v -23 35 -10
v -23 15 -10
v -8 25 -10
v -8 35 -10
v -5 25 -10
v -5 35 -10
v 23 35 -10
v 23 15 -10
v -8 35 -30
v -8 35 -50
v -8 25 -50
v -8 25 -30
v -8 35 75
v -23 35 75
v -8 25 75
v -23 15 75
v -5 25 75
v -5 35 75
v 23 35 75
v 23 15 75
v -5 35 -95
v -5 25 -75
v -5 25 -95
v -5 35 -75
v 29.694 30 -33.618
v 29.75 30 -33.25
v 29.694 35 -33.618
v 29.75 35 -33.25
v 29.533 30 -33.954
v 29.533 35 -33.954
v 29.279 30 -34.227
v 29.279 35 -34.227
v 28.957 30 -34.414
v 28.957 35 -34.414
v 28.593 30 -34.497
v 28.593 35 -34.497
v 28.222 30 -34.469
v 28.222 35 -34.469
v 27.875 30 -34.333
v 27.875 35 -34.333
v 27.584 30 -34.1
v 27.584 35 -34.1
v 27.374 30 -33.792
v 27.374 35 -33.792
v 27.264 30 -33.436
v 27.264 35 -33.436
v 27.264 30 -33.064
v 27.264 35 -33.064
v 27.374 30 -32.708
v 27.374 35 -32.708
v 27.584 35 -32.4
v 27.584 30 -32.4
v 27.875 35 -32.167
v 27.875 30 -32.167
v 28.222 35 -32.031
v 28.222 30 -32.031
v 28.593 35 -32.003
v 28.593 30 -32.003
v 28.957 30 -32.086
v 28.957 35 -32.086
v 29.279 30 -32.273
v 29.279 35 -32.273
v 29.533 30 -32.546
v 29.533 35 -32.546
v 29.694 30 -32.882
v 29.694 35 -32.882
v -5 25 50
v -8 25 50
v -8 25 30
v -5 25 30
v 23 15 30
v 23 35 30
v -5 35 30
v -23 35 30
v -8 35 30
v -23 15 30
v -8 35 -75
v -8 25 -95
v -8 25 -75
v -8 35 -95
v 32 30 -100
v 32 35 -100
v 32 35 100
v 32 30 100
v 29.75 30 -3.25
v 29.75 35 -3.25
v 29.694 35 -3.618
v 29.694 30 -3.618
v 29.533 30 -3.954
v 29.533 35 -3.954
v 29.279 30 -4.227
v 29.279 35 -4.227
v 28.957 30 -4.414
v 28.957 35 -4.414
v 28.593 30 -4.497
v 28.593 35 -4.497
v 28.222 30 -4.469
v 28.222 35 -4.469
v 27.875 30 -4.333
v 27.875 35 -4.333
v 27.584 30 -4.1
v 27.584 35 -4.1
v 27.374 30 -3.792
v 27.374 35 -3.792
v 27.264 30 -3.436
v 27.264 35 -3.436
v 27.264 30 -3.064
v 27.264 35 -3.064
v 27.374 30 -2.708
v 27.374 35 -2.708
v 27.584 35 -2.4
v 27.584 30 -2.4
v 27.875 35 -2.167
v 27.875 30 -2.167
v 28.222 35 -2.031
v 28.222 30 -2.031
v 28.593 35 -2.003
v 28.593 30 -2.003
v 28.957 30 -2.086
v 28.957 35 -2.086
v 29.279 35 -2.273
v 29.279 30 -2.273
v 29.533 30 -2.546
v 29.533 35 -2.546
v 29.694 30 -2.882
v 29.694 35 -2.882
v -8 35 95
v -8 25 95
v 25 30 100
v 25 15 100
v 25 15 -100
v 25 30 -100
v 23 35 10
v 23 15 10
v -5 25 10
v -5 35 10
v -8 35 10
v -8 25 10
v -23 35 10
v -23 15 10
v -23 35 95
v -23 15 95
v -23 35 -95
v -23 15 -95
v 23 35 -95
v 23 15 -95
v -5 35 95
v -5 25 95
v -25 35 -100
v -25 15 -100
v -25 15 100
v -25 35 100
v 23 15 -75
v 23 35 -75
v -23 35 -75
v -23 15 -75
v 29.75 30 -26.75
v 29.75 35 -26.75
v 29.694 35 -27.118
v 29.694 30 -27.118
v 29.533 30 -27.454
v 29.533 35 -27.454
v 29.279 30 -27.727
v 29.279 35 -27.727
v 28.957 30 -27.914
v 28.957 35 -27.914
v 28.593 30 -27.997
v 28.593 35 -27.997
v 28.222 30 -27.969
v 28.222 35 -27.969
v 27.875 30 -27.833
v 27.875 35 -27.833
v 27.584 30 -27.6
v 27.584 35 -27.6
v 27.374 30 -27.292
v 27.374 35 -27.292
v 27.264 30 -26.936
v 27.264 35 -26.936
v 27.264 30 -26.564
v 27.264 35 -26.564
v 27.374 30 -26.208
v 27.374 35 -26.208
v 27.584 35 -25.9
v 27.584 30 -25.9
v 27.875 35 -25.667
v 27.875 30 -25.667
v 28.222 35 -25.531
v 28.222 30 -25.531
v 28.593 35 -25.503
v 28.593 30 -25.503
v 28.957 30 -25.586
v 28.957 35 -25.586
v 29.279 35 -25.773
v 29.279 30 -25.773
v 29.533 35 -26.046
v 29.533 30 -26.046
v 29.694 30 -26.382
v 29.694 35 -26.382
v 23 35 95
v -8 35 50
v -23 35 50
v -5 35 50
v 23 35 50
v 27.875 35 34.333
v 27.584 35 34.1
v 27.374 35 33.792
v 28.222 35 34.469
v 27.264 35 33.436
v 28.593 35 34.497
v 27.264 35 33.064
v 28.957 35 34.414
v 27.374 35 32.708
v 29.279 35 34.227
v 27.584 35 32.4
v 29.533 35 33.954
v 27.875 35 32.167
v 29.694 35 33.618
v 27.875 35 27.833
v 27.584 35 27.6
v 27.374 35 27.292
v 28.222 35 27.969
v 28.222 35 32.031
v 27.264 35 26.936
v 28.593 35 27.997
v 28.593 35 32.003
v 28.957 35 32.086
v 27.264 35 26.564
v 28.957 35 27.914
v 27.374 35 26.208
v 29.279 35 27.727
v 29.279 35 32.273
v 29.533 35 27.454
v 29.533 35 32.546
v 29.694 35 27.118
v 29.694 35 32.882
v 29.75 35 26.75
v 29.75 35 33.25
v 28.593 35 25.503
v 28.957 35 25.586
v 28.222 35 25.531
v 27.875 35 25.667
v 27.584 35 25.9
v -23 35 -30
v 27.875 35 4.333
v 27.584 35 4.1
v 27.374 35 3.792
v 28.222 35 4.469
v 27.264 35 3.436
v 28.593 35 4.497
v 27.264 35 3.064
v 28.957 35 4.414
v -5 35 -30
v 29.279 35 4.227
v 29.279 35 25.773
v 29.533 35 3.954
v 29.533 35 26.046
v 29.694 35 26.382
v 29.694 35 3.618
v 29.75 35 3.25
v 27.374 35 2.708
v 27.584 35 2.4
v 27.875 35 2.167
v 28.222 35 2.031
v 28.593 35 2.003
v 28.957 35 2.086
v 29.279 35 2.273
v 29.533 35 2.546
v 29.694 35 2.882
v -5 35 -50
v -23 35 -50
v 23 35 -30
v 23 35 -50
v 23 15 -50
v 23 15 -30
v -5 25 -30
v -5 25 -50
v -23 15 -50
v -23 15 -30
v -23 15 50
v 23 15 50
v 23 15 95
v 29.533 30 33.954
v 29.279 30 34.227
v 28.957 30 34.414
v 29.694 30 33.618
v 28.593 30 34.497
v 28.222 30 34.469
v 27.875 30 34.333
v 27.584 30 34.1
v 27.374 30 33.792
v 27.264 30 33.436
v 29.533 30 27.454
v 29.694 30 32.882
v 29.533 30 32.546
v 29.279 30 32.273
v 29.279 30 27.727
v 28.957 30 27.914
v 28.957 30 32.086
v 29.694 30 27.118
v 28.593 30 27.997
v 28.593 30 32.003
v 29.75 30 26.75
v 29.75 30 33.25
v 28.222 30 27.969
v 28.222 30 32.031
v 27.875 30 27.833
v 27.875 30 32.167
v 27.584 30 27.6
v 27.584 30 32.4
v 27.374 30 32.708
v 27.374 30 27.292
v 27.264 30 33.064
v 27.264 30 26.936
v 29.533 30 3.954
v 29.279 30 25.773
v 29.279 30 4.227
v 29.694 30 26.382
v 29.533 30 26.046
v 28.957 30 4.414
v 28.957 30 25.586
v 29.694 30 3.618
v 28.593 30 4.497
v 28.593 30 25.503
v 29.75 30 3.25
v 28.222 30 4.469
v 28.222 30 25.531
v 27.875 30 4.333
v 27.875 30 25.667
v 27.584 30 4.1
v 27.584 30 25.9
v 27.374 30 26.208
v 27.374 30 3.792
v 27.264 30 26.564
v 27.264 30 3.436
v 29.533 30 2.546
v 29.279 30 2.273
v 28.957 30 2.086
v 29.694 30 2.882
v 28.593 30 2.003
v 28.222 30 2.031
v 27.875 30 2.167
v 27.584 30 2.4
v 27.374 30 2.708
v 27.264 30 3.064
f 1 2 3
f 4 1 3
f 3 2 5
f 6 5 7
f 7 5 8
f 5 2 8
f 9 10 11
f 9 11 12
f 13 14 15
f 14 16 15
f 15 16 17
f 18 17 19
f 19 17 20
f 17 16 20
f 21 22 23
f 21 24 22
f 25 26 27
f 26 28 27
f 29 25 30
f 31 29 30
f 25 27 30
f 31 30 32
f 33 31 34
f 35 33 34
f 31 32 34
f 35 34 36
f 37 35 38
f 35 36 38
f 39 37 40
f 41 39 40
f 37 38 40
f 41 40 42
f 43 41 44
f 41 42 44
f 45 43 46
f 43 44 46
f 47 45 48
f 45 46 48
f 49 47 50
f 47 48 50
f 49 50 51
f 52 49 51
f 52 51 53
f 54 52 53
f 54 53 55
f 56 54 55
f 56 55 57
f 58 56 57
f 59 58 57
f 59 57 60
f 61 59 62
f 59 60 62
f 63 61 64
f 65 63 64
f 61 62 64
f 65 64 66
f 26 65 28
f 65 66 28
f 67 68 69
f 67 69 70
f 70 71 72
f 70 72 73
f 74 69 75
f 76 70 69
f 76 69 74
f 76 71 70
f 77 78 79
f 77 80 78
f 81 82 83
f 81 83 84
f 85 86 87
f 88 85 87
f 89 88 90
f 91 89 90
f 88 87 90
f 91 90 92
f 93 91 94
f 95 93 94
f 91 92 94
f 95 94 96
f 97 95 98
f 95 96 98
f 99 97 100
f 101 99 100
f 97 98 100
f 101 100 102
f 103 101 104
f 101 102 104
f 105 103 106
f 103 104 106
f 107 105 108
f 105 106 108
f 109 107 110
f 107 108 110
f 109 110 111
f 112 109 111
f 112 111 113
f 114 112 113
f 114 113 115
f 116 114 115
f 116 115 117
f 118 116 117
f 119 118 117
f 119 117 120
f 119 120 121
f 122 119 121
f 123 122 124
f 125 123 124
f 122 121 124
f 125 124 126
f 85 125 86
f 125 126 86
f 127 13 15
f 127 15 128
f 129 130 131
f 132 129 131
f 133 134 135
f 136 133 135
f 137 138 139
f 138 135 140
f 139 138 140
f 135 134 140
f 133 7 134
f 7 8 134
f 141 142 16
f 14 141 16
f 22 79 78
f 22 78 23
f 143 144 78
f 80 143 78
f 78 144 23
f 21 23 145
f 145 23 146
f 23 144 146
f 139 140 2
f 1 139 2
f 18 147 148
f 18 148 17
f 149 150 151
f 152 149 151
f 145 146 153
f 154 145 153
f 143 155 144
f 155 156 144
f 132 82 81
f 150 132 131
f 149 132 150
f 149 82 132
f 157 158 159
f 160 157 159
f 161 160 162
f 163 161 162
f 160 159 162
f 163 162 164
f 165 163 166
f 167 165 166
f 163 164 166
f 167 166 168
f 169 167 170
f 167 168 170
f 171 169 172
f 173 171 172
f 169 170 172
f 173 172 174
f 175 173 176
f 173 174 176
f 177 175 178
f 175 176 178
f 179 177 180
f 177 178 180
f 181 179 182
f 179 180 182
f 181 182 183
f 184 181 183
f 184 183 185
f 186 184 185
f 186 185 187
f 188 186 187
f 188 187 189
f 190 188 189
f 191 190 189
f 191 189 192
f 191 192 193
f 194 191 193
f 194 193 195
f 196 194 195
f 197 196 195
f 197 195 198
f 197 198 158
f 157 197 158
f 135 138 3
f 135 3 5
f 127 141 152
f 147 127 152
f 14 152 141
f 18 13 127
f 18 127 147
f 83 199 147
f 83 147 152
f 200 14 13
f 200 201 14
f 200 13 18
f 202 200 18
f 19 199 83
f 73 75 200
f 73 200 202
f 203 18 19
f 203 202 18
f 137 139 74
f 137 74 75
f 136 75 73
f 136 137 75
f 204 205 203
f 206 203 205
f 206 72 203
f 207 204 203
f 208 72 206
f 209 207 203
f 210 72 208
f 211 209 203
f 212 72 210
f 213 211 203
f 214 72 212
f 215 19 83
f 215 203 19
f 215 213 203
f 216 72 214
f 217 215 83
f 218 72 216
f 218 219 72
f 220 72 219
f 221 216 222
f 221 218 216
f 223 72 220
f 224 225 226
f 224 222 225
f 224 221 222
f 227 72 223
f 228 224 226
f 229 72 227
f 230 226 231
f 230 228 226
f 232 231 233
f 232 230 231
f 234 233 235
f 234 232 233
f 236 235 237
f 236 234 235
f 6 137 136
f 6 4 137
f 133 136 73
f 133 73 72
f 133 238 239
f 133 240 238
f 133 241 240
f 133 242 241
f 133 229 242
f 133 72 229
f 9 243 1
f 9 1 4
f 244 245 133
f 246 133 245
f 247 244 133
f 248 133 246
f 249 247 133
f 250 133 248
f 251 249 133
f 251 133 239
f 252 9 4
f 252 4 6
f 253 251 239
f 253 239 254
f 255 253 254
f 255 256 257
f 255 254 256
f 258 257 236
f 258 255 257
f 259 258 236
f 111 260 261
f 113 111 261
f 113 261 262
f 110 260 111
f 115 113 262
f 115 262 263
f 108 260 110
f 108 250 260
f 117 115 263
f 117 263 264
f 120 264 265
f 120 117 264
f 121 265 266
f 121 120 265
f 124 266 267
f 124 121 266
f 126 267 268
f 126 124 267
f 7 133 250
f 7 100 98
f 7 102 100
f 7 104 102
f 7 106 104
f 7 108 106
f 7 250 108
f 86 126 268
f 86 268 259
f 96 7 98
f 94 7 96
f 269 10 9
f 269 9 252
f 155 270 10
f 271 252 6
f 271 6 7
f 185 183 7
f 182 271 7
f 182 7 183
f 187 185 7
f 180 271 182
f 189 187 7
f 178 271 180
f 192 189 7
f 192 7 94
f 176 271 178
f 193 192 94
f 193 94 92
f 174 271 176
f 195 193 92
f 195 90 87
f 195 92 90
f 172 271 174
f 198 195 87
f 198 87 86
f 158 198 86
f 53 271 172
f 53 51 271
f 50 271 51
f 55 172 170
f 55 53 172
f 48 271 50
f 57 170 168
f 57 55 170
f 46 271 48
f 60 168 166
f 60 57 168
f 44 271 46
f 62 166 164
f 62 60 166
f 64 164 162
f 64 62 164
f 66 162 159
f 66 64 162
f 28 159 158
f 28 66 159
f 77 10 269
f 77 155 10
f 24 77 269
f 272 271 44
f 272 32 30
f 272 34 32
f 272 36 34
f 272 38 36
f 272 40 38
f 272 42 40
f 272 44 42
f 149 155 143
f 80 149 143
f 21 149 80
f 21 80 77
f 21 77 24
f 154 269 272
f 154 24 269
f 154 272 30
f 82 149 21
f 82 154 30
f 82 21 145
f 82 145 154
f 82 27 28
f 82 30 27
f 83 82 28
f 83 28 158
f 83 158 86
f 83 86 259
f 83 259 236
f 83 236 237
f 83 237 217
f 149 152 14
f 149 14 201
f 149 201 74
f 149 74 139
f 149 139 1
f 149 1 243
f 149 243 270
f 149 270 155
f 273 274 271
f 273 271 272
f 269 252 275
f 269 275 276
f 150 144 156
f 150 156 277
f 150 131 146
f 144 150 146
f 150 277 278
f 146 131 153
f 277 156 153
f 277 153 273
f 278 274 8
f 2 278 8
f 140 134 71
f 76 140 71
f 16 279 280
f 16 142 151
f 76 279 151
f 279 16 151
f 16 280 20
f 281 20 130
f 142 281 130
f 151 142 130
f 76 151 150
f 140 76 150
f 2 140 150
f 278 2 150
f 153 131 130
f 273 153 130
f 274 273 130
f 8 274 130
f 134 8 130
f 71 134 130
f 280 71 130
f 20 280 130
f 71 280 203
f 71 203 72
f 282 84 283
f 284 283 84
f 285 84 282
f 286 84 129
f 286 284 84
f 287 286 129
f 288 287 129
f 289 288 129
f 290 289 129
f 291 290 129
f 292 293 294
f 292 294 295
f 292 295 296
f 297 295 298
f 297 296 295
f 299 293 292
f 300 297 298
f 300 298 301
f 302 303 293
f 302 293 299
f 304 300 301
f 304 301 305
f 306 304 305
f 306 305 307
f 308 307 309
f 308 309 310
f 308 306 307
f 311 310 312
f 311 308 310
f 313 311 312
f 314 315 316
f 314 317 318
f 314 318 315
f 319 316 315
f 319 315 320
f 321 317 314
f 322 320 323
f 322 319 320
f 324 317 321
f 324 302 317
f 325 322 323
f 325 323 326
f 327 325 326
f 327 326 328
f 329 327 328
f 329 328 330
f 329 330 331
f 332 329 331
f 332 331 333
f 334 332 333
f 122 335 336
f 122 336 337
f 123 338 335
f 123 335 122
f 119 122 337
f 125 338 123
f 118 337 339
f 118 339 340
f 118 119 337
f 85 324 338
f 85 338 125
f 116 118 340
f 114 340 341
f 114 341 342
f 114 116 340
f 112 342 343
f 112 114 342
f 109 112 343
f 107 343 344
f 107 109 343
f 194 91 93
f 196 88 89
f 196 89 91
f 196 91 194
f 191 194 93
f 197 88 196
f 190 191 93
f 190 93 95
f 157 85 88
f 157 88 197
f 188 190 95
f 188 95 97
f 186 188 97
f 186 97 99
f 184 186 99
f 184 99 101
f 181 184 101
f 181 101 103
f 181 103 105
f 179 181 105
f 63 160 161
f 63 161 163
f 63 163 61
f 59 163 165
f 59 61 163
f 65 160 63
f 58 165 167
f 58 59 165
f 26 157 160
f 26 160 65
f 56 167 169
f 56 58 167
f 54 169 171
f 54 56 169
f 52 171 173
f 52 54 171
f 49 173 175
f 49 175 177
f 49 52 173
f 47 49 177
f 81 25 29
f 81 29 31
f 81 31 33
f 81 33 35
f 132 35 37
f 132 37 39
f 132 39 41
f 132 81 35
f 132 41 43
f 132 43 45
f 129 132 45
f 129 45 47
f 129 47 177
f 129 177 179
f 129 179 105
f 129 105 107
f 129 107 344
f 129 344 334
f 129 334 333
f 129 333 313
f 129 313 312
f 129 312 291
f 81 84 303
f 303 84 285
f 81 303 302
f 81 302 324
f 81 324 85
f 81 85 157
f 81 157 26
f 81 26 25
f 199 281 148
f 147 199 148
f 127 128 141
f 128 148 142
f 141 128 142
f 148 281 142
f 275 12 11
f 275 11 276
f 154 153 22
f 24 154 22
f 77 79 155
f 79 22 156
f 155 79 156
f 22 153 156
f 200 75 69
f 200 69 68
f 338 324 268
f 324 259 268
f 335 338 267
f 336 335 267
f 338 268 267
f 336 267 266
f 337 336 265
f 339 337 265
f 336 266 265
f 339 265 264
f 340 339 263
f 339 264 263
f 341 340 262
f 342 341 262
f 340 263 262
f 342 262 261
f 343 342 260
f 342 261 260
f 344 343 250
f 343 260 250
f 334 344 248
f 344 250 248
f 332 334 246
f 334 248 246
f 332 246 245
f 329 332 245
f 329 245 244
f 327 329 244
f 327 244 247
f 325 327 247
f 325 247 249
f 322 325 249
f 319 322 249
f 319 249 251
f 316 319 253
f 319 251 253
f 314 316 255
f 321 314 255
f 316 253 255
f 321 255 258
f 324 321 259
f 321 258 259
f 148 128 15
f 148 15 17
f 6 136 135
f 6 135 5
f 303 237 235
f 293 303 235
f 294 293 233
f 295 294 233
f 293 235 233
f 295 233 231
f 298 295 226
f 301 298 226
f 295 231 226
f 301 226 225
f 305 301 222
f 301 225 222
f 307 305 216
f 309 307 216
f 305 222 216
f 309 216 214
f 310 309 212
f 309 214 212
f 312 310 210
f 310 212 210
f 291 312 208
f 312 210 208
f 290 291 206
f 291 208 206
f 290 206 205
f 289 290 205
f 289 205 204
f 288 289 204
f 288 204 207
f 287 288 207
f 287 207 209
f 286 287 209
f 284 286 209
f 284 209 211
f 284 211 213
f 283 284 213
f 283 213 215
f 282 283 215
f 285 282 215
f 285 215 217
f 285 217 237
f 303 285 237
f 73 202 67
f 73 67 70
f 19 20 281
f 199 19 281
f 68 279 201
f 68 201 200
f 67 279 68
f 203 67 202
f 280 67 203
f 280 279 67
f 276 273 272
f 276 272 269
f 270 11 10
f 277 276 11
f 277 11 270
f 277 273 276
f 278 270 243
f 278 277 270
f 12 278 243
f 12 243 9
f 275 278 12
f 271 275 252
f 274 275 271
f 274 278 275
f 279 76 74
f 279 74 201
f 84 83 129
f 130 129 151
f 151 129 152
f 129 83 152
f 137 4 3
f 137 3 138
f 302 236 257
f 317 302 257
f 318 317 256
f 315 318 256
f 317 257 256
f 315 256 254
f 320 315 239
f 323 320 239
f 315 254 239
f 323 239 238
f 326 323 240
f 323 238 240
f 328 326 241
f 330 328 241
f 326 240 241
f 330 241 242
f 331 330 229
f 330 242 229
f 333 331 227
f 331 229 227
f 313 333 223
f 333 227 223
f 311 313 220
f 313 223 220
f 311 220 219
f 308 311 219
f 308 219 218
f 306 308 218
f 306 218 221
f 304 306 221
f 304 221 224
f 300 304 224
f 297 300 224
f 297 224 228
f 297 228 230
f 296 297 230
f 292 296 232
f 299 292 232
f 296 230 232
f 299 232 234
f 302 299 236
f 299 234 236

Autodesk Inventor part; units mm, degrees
ref_plane "YZ Plane" through (0, 0, 0) normal (1, 0, 0) x (0, 1, 0)
ref_plane "XZ Plane" through (0, 0, 0) normal (0, 1, 0) x (-1, 0, 0)
ref_plane "XY Plane" through (0, 0, 0) normal (0, 0, 1) x (1, 0, 0)
sketch "Sketch1" plane through (0, 0, 0) normal (0, 1, 0) x (-1, 0, 0)
  line L0 (-25, -100) -> (25, -100)
  line L1 (25, -100) -> (25, 100)
  line L2 (25, 100) -> (-25, 100)
  line L3 (-25, 100) -> (-25, -100)
  line L4 (-25, -100) -> (25, 100) construction
  line L5 (25, -100) -> (-25, 100) construction
  line L6 (23, 50) -> (-23, 50)
  line L7 (-23, 50) -> (-23, 30)
  line L8 (-23, 30) -> (23, 30)
  line L9 (23, 30) -> (23, 50)
  line L10 (23, 50) -> (-23, 30) construction
  line L11 (-23, 50) -> (23, 30) construction
  line L12 (23, -30) -> (-23, -30)
  line L13 (-23, -30) -> (-23, -50)
  line L14 (-23, -50) -> (23, -50)
  line L15 (23, -50) -> (23, -30)
  line L16 (23, -30) -> (-23, -50) construction
  line L17 (-23, -30) -> (23, -50) construction
  line L18 (-23, 10) -> (23, 10)
  line L19 (23, 10) -> (23, -10)
  line L20 (23, -10) -> (-23, -10)
  line L21 (-23, -10) -> (-23, 10)
  line L22 (-23, 10) -> (23, -10) construction
  line L23 (23, 10) -> (-23, -10) construction
  line L24 (-23, 95) -> (23, 95)
  line L25 (23, 95) -> (23, 75)
  line L26 (23, 75) -> (-23, 75)
  line L27 (-23, 75) -> (-23, 95)
  line L28 (-23, 95) -> (23, 75) construction
  line L29 (23, 95) -> (-23, 75) construction
  line L30 (-23, -75) -> (23, -75)
  line L31 (23, -75) -> (23, -95)
  line L32 (23, -95) -> (-23, -95)
  line L33 (-23, -95) -> (-23, -75)
  line L34 (-23, -75) -> (23, -95) construction
  line L35 (23, -75) -> (-23, -95) construction
  point P0 (0, 0)
  point P1 (0, 40)
  point P2 (0, -40)
  point P3 (0, 0)
  point P4 (0, 85)
  point P5 (0, -85)
  dimension "d0" = 200
  dimension "d1" = 50
  dimension "d2" = 2
  dimension "d3" = 46
  dimension "d4" = 20
  dimension "d5" = 46
  dimension "d6" = 20
  dimension "d7" = 2
  dimension "d8" = 20
  dimension "d9" = 46
  dimension "d10" = 2
  dimension "d11" = 0
  dimension "d12" = 20
  dimension "d13" = 20
  dimension "d14" = 46
  dimension "d15" = 20
  dimension "d16" = 20
  dimension "d17" = 46
  dimension "d18" = 2
  dimension "d19" = 2
  dimension "d20" = 25
  dimension "d21" = 25
extrude "Extrusion1" add sketch "Sketch1" along normal blind 35
sketch "Sketch2" plane through (0, 35, 0) normal (0, 1, 0) x (1, 0, 0)
  line L0 (23, -95) -> (-23, -95) projected
  line L1 (-23, -75) -> (23, -75) projected
  line L2 (-8, -95) -> (-5, -95)
  line L3 (-5, -95) -> (-5, -75)
  line L4 (-5, -75) -> (-8, -75)
  line L5 (-8, -75) -> (-8, -95)
  line L6 (-23, -30) -> (23, -30) projected
  line L7 (-8, -50.2373) -> (-5, -50.2373)
  line L8 (-5, -50.2373) -> (-5, -30)
  line L9 (-5, -30) -> (-8, -30)
  line L10 (-8, -30) -> (-8, -50.2373)
  line L11 (-8, -10.1346) -> (-5, -10.1346)
  line L12 (-5, -10.1346) -> (-5, 9.9167)
  line L13 (-5, 9.9167) -> (-8, 9.9167)
  line L14 (-8, 9.9167) -> (-8, -10.1346)
  line L15 (-23, 50) -> (23, 50) projected
  line L16 (-8, 29.7501) -> (-5, 29.7501)
  line L17 (-5, 29.7501) -> (-5, 50)
  line L18 (-5, 50) -> (-8, 50)
  line L19 (-8, 50) -> (-8, 29.7501)
  line L20 (23, 75) -> (-23, 75) projected
  line L21 (-23, 95) -> (23, 95) projected
  line L22 (-8, 75) -> (-5, 75)
  line L23 (-5, 75) -> (-5, 95)
  line L24 (-5, 95) -> (-8, 95)
  line L25 (-8, 95) -> (-8, 75)
  line L26 (-23, -95) -> (-23, -75) projected
  line L27 (-23, 75) -> (-23, 95) projected
  point P0 (0, 0)
  dimension "d24" = 3
  dimension "d25" = 3
  dimension "d26" = 3
  dimension "d27" = 3
  dimension "d28" = 3
  dimension "d29" = 15
  dimension "d30" = 15
extrude "Extrusion2" add sketch "Sketch2" against normal blind 10 contours L0 L5 L1 L3 | L6 L8 L7 L10 | L14 L13 L12 L11 | L15 L17 L16 L19 | L20 L25 L21 L23
sketch "Sketch3" plane through (0, 35, 0) normal (0, 1, 0) x (1, 0, 0)
  line L0 (-5, -10) -> (-5, 9.9167) projected
  line L1 (-8, 30) -> (-8, 50) projected
  line L2 (-5, 8.437) -> (-8, 8.437)
  line L3 (-8, 8.437) -> (-8, 32.4131)
  line L4 (-8, 32.4131) -> (-5, 32.4131)
  line L5 (-5, 32.4131) -> (-5, 8.437)
  point P0 (0, 0)
extrude "Extrusion3" add sketch "Sketch3" against normal blind 10
sketch "Sketch4" plane through (25, 0, -100) normal (0, 0, -1) x (-1, 0, 0)
  line L0 (0, 35) -> (-7, 35)
  line L1 (-7, 35) -> (-7, 30)
  line L2 (-7, 30) -> (0, 30)
  line L3 (0, 30) -> (0, 35)
  line L4 (0, 0) -> (0, 35) projected
  line L5 (0, 35) -> (50, 35) projected
  point P0 (25, 0)
  dimension "d35" = 0
  dimension "d36" = 7
  dimension "d37" = 5
  dimension "d38" = 0
extrude "Extrusion4" add sketch "Sketch4" against normal blind 200
sketch "Sketch5" plane through (25, 0, -100) normal (0, 0, -1) x (-1, 0, 0)
  point P0 (25, 0)
sketch "Sketch6" plane through (0, 35, 0) normal (0, 1, 0) x (1, 0, 0)
  circle A0 centre (28.5, -33.25) radius 1.25
  circle A1 centre (28.5, -26.75) radius 1.25
  line L0 (32, 100) -> (32, -100)
  circle A2 centre (28.5, -3.25) radius 1.25
  circle A3 centre (28.5, 3.25) radius 1.25
  circle A4 centre (28.5, 26.75) radius 1.25
  circle A5 centre (28.5, 33.25) radius 1.25
  line L1 (-25, 100) -> (32, 100)
  line L2 (-25, -100) -> (32, -100)
  point P0 (0, 0)
  dimension "d41" = 2.5
  dimension "d42" = 2.5
  dimension "d46" = 2.5
  dimension "d47" = 2.5
  dimension "d48" = 2.5
  dimension "d49" = 2.5
  dimension "d51" = 4
  dimension "d53" = 4
  dimension "d54" = 3.5
  dimension "d55" = 3.5
  dimension "d56" = 3.5
  dimension "d57" = 4
  dimension "d58" = 3.5
  dimension "d59" = 3.5
  dimension "d62" = 96.75
  dimension "d63" = 3.5
  dimension "d66" = 21
  dimension "d67" = 21
extrude "Extrusion5" cut sketch "Sketch6" against normal blind 30
sketch "Sketch7" plane through (25, 0, -100) normal (0, 0, -1) x (-1, 0, 0)
  point P0 (25, 0)
sketch "Sketch8" plane through (0, 35, 0) normal (0, 1, 0) x (1, 0, 0)
  point P0 (0, 0)
sketch "Sketch9" plane through (25, 0, 100) normal (1, 0, 0) x (0, 0, -1)
  line L0 (-3.3992, 0) -> (201.6008, 0)
  line L1 (201.6008, 0) -> (201.6008, 15)
  line L2 (201.6008, 15) -> (-3.3992, 15)
  line L3 (-3.3992, 15) -> (-3.3992, 0)
  line L4 (0, 0) -> (200, 0) projected
  point P0 (100, 0)
  dimension "d68" = 15
  dimension "d69" = 0
  dimension "d70" = 205
extrude "Extrusion6" cut sketch "Sketch9" against normal blind 55
properties part number "Fem_Sensor_Indtil_Videre"
